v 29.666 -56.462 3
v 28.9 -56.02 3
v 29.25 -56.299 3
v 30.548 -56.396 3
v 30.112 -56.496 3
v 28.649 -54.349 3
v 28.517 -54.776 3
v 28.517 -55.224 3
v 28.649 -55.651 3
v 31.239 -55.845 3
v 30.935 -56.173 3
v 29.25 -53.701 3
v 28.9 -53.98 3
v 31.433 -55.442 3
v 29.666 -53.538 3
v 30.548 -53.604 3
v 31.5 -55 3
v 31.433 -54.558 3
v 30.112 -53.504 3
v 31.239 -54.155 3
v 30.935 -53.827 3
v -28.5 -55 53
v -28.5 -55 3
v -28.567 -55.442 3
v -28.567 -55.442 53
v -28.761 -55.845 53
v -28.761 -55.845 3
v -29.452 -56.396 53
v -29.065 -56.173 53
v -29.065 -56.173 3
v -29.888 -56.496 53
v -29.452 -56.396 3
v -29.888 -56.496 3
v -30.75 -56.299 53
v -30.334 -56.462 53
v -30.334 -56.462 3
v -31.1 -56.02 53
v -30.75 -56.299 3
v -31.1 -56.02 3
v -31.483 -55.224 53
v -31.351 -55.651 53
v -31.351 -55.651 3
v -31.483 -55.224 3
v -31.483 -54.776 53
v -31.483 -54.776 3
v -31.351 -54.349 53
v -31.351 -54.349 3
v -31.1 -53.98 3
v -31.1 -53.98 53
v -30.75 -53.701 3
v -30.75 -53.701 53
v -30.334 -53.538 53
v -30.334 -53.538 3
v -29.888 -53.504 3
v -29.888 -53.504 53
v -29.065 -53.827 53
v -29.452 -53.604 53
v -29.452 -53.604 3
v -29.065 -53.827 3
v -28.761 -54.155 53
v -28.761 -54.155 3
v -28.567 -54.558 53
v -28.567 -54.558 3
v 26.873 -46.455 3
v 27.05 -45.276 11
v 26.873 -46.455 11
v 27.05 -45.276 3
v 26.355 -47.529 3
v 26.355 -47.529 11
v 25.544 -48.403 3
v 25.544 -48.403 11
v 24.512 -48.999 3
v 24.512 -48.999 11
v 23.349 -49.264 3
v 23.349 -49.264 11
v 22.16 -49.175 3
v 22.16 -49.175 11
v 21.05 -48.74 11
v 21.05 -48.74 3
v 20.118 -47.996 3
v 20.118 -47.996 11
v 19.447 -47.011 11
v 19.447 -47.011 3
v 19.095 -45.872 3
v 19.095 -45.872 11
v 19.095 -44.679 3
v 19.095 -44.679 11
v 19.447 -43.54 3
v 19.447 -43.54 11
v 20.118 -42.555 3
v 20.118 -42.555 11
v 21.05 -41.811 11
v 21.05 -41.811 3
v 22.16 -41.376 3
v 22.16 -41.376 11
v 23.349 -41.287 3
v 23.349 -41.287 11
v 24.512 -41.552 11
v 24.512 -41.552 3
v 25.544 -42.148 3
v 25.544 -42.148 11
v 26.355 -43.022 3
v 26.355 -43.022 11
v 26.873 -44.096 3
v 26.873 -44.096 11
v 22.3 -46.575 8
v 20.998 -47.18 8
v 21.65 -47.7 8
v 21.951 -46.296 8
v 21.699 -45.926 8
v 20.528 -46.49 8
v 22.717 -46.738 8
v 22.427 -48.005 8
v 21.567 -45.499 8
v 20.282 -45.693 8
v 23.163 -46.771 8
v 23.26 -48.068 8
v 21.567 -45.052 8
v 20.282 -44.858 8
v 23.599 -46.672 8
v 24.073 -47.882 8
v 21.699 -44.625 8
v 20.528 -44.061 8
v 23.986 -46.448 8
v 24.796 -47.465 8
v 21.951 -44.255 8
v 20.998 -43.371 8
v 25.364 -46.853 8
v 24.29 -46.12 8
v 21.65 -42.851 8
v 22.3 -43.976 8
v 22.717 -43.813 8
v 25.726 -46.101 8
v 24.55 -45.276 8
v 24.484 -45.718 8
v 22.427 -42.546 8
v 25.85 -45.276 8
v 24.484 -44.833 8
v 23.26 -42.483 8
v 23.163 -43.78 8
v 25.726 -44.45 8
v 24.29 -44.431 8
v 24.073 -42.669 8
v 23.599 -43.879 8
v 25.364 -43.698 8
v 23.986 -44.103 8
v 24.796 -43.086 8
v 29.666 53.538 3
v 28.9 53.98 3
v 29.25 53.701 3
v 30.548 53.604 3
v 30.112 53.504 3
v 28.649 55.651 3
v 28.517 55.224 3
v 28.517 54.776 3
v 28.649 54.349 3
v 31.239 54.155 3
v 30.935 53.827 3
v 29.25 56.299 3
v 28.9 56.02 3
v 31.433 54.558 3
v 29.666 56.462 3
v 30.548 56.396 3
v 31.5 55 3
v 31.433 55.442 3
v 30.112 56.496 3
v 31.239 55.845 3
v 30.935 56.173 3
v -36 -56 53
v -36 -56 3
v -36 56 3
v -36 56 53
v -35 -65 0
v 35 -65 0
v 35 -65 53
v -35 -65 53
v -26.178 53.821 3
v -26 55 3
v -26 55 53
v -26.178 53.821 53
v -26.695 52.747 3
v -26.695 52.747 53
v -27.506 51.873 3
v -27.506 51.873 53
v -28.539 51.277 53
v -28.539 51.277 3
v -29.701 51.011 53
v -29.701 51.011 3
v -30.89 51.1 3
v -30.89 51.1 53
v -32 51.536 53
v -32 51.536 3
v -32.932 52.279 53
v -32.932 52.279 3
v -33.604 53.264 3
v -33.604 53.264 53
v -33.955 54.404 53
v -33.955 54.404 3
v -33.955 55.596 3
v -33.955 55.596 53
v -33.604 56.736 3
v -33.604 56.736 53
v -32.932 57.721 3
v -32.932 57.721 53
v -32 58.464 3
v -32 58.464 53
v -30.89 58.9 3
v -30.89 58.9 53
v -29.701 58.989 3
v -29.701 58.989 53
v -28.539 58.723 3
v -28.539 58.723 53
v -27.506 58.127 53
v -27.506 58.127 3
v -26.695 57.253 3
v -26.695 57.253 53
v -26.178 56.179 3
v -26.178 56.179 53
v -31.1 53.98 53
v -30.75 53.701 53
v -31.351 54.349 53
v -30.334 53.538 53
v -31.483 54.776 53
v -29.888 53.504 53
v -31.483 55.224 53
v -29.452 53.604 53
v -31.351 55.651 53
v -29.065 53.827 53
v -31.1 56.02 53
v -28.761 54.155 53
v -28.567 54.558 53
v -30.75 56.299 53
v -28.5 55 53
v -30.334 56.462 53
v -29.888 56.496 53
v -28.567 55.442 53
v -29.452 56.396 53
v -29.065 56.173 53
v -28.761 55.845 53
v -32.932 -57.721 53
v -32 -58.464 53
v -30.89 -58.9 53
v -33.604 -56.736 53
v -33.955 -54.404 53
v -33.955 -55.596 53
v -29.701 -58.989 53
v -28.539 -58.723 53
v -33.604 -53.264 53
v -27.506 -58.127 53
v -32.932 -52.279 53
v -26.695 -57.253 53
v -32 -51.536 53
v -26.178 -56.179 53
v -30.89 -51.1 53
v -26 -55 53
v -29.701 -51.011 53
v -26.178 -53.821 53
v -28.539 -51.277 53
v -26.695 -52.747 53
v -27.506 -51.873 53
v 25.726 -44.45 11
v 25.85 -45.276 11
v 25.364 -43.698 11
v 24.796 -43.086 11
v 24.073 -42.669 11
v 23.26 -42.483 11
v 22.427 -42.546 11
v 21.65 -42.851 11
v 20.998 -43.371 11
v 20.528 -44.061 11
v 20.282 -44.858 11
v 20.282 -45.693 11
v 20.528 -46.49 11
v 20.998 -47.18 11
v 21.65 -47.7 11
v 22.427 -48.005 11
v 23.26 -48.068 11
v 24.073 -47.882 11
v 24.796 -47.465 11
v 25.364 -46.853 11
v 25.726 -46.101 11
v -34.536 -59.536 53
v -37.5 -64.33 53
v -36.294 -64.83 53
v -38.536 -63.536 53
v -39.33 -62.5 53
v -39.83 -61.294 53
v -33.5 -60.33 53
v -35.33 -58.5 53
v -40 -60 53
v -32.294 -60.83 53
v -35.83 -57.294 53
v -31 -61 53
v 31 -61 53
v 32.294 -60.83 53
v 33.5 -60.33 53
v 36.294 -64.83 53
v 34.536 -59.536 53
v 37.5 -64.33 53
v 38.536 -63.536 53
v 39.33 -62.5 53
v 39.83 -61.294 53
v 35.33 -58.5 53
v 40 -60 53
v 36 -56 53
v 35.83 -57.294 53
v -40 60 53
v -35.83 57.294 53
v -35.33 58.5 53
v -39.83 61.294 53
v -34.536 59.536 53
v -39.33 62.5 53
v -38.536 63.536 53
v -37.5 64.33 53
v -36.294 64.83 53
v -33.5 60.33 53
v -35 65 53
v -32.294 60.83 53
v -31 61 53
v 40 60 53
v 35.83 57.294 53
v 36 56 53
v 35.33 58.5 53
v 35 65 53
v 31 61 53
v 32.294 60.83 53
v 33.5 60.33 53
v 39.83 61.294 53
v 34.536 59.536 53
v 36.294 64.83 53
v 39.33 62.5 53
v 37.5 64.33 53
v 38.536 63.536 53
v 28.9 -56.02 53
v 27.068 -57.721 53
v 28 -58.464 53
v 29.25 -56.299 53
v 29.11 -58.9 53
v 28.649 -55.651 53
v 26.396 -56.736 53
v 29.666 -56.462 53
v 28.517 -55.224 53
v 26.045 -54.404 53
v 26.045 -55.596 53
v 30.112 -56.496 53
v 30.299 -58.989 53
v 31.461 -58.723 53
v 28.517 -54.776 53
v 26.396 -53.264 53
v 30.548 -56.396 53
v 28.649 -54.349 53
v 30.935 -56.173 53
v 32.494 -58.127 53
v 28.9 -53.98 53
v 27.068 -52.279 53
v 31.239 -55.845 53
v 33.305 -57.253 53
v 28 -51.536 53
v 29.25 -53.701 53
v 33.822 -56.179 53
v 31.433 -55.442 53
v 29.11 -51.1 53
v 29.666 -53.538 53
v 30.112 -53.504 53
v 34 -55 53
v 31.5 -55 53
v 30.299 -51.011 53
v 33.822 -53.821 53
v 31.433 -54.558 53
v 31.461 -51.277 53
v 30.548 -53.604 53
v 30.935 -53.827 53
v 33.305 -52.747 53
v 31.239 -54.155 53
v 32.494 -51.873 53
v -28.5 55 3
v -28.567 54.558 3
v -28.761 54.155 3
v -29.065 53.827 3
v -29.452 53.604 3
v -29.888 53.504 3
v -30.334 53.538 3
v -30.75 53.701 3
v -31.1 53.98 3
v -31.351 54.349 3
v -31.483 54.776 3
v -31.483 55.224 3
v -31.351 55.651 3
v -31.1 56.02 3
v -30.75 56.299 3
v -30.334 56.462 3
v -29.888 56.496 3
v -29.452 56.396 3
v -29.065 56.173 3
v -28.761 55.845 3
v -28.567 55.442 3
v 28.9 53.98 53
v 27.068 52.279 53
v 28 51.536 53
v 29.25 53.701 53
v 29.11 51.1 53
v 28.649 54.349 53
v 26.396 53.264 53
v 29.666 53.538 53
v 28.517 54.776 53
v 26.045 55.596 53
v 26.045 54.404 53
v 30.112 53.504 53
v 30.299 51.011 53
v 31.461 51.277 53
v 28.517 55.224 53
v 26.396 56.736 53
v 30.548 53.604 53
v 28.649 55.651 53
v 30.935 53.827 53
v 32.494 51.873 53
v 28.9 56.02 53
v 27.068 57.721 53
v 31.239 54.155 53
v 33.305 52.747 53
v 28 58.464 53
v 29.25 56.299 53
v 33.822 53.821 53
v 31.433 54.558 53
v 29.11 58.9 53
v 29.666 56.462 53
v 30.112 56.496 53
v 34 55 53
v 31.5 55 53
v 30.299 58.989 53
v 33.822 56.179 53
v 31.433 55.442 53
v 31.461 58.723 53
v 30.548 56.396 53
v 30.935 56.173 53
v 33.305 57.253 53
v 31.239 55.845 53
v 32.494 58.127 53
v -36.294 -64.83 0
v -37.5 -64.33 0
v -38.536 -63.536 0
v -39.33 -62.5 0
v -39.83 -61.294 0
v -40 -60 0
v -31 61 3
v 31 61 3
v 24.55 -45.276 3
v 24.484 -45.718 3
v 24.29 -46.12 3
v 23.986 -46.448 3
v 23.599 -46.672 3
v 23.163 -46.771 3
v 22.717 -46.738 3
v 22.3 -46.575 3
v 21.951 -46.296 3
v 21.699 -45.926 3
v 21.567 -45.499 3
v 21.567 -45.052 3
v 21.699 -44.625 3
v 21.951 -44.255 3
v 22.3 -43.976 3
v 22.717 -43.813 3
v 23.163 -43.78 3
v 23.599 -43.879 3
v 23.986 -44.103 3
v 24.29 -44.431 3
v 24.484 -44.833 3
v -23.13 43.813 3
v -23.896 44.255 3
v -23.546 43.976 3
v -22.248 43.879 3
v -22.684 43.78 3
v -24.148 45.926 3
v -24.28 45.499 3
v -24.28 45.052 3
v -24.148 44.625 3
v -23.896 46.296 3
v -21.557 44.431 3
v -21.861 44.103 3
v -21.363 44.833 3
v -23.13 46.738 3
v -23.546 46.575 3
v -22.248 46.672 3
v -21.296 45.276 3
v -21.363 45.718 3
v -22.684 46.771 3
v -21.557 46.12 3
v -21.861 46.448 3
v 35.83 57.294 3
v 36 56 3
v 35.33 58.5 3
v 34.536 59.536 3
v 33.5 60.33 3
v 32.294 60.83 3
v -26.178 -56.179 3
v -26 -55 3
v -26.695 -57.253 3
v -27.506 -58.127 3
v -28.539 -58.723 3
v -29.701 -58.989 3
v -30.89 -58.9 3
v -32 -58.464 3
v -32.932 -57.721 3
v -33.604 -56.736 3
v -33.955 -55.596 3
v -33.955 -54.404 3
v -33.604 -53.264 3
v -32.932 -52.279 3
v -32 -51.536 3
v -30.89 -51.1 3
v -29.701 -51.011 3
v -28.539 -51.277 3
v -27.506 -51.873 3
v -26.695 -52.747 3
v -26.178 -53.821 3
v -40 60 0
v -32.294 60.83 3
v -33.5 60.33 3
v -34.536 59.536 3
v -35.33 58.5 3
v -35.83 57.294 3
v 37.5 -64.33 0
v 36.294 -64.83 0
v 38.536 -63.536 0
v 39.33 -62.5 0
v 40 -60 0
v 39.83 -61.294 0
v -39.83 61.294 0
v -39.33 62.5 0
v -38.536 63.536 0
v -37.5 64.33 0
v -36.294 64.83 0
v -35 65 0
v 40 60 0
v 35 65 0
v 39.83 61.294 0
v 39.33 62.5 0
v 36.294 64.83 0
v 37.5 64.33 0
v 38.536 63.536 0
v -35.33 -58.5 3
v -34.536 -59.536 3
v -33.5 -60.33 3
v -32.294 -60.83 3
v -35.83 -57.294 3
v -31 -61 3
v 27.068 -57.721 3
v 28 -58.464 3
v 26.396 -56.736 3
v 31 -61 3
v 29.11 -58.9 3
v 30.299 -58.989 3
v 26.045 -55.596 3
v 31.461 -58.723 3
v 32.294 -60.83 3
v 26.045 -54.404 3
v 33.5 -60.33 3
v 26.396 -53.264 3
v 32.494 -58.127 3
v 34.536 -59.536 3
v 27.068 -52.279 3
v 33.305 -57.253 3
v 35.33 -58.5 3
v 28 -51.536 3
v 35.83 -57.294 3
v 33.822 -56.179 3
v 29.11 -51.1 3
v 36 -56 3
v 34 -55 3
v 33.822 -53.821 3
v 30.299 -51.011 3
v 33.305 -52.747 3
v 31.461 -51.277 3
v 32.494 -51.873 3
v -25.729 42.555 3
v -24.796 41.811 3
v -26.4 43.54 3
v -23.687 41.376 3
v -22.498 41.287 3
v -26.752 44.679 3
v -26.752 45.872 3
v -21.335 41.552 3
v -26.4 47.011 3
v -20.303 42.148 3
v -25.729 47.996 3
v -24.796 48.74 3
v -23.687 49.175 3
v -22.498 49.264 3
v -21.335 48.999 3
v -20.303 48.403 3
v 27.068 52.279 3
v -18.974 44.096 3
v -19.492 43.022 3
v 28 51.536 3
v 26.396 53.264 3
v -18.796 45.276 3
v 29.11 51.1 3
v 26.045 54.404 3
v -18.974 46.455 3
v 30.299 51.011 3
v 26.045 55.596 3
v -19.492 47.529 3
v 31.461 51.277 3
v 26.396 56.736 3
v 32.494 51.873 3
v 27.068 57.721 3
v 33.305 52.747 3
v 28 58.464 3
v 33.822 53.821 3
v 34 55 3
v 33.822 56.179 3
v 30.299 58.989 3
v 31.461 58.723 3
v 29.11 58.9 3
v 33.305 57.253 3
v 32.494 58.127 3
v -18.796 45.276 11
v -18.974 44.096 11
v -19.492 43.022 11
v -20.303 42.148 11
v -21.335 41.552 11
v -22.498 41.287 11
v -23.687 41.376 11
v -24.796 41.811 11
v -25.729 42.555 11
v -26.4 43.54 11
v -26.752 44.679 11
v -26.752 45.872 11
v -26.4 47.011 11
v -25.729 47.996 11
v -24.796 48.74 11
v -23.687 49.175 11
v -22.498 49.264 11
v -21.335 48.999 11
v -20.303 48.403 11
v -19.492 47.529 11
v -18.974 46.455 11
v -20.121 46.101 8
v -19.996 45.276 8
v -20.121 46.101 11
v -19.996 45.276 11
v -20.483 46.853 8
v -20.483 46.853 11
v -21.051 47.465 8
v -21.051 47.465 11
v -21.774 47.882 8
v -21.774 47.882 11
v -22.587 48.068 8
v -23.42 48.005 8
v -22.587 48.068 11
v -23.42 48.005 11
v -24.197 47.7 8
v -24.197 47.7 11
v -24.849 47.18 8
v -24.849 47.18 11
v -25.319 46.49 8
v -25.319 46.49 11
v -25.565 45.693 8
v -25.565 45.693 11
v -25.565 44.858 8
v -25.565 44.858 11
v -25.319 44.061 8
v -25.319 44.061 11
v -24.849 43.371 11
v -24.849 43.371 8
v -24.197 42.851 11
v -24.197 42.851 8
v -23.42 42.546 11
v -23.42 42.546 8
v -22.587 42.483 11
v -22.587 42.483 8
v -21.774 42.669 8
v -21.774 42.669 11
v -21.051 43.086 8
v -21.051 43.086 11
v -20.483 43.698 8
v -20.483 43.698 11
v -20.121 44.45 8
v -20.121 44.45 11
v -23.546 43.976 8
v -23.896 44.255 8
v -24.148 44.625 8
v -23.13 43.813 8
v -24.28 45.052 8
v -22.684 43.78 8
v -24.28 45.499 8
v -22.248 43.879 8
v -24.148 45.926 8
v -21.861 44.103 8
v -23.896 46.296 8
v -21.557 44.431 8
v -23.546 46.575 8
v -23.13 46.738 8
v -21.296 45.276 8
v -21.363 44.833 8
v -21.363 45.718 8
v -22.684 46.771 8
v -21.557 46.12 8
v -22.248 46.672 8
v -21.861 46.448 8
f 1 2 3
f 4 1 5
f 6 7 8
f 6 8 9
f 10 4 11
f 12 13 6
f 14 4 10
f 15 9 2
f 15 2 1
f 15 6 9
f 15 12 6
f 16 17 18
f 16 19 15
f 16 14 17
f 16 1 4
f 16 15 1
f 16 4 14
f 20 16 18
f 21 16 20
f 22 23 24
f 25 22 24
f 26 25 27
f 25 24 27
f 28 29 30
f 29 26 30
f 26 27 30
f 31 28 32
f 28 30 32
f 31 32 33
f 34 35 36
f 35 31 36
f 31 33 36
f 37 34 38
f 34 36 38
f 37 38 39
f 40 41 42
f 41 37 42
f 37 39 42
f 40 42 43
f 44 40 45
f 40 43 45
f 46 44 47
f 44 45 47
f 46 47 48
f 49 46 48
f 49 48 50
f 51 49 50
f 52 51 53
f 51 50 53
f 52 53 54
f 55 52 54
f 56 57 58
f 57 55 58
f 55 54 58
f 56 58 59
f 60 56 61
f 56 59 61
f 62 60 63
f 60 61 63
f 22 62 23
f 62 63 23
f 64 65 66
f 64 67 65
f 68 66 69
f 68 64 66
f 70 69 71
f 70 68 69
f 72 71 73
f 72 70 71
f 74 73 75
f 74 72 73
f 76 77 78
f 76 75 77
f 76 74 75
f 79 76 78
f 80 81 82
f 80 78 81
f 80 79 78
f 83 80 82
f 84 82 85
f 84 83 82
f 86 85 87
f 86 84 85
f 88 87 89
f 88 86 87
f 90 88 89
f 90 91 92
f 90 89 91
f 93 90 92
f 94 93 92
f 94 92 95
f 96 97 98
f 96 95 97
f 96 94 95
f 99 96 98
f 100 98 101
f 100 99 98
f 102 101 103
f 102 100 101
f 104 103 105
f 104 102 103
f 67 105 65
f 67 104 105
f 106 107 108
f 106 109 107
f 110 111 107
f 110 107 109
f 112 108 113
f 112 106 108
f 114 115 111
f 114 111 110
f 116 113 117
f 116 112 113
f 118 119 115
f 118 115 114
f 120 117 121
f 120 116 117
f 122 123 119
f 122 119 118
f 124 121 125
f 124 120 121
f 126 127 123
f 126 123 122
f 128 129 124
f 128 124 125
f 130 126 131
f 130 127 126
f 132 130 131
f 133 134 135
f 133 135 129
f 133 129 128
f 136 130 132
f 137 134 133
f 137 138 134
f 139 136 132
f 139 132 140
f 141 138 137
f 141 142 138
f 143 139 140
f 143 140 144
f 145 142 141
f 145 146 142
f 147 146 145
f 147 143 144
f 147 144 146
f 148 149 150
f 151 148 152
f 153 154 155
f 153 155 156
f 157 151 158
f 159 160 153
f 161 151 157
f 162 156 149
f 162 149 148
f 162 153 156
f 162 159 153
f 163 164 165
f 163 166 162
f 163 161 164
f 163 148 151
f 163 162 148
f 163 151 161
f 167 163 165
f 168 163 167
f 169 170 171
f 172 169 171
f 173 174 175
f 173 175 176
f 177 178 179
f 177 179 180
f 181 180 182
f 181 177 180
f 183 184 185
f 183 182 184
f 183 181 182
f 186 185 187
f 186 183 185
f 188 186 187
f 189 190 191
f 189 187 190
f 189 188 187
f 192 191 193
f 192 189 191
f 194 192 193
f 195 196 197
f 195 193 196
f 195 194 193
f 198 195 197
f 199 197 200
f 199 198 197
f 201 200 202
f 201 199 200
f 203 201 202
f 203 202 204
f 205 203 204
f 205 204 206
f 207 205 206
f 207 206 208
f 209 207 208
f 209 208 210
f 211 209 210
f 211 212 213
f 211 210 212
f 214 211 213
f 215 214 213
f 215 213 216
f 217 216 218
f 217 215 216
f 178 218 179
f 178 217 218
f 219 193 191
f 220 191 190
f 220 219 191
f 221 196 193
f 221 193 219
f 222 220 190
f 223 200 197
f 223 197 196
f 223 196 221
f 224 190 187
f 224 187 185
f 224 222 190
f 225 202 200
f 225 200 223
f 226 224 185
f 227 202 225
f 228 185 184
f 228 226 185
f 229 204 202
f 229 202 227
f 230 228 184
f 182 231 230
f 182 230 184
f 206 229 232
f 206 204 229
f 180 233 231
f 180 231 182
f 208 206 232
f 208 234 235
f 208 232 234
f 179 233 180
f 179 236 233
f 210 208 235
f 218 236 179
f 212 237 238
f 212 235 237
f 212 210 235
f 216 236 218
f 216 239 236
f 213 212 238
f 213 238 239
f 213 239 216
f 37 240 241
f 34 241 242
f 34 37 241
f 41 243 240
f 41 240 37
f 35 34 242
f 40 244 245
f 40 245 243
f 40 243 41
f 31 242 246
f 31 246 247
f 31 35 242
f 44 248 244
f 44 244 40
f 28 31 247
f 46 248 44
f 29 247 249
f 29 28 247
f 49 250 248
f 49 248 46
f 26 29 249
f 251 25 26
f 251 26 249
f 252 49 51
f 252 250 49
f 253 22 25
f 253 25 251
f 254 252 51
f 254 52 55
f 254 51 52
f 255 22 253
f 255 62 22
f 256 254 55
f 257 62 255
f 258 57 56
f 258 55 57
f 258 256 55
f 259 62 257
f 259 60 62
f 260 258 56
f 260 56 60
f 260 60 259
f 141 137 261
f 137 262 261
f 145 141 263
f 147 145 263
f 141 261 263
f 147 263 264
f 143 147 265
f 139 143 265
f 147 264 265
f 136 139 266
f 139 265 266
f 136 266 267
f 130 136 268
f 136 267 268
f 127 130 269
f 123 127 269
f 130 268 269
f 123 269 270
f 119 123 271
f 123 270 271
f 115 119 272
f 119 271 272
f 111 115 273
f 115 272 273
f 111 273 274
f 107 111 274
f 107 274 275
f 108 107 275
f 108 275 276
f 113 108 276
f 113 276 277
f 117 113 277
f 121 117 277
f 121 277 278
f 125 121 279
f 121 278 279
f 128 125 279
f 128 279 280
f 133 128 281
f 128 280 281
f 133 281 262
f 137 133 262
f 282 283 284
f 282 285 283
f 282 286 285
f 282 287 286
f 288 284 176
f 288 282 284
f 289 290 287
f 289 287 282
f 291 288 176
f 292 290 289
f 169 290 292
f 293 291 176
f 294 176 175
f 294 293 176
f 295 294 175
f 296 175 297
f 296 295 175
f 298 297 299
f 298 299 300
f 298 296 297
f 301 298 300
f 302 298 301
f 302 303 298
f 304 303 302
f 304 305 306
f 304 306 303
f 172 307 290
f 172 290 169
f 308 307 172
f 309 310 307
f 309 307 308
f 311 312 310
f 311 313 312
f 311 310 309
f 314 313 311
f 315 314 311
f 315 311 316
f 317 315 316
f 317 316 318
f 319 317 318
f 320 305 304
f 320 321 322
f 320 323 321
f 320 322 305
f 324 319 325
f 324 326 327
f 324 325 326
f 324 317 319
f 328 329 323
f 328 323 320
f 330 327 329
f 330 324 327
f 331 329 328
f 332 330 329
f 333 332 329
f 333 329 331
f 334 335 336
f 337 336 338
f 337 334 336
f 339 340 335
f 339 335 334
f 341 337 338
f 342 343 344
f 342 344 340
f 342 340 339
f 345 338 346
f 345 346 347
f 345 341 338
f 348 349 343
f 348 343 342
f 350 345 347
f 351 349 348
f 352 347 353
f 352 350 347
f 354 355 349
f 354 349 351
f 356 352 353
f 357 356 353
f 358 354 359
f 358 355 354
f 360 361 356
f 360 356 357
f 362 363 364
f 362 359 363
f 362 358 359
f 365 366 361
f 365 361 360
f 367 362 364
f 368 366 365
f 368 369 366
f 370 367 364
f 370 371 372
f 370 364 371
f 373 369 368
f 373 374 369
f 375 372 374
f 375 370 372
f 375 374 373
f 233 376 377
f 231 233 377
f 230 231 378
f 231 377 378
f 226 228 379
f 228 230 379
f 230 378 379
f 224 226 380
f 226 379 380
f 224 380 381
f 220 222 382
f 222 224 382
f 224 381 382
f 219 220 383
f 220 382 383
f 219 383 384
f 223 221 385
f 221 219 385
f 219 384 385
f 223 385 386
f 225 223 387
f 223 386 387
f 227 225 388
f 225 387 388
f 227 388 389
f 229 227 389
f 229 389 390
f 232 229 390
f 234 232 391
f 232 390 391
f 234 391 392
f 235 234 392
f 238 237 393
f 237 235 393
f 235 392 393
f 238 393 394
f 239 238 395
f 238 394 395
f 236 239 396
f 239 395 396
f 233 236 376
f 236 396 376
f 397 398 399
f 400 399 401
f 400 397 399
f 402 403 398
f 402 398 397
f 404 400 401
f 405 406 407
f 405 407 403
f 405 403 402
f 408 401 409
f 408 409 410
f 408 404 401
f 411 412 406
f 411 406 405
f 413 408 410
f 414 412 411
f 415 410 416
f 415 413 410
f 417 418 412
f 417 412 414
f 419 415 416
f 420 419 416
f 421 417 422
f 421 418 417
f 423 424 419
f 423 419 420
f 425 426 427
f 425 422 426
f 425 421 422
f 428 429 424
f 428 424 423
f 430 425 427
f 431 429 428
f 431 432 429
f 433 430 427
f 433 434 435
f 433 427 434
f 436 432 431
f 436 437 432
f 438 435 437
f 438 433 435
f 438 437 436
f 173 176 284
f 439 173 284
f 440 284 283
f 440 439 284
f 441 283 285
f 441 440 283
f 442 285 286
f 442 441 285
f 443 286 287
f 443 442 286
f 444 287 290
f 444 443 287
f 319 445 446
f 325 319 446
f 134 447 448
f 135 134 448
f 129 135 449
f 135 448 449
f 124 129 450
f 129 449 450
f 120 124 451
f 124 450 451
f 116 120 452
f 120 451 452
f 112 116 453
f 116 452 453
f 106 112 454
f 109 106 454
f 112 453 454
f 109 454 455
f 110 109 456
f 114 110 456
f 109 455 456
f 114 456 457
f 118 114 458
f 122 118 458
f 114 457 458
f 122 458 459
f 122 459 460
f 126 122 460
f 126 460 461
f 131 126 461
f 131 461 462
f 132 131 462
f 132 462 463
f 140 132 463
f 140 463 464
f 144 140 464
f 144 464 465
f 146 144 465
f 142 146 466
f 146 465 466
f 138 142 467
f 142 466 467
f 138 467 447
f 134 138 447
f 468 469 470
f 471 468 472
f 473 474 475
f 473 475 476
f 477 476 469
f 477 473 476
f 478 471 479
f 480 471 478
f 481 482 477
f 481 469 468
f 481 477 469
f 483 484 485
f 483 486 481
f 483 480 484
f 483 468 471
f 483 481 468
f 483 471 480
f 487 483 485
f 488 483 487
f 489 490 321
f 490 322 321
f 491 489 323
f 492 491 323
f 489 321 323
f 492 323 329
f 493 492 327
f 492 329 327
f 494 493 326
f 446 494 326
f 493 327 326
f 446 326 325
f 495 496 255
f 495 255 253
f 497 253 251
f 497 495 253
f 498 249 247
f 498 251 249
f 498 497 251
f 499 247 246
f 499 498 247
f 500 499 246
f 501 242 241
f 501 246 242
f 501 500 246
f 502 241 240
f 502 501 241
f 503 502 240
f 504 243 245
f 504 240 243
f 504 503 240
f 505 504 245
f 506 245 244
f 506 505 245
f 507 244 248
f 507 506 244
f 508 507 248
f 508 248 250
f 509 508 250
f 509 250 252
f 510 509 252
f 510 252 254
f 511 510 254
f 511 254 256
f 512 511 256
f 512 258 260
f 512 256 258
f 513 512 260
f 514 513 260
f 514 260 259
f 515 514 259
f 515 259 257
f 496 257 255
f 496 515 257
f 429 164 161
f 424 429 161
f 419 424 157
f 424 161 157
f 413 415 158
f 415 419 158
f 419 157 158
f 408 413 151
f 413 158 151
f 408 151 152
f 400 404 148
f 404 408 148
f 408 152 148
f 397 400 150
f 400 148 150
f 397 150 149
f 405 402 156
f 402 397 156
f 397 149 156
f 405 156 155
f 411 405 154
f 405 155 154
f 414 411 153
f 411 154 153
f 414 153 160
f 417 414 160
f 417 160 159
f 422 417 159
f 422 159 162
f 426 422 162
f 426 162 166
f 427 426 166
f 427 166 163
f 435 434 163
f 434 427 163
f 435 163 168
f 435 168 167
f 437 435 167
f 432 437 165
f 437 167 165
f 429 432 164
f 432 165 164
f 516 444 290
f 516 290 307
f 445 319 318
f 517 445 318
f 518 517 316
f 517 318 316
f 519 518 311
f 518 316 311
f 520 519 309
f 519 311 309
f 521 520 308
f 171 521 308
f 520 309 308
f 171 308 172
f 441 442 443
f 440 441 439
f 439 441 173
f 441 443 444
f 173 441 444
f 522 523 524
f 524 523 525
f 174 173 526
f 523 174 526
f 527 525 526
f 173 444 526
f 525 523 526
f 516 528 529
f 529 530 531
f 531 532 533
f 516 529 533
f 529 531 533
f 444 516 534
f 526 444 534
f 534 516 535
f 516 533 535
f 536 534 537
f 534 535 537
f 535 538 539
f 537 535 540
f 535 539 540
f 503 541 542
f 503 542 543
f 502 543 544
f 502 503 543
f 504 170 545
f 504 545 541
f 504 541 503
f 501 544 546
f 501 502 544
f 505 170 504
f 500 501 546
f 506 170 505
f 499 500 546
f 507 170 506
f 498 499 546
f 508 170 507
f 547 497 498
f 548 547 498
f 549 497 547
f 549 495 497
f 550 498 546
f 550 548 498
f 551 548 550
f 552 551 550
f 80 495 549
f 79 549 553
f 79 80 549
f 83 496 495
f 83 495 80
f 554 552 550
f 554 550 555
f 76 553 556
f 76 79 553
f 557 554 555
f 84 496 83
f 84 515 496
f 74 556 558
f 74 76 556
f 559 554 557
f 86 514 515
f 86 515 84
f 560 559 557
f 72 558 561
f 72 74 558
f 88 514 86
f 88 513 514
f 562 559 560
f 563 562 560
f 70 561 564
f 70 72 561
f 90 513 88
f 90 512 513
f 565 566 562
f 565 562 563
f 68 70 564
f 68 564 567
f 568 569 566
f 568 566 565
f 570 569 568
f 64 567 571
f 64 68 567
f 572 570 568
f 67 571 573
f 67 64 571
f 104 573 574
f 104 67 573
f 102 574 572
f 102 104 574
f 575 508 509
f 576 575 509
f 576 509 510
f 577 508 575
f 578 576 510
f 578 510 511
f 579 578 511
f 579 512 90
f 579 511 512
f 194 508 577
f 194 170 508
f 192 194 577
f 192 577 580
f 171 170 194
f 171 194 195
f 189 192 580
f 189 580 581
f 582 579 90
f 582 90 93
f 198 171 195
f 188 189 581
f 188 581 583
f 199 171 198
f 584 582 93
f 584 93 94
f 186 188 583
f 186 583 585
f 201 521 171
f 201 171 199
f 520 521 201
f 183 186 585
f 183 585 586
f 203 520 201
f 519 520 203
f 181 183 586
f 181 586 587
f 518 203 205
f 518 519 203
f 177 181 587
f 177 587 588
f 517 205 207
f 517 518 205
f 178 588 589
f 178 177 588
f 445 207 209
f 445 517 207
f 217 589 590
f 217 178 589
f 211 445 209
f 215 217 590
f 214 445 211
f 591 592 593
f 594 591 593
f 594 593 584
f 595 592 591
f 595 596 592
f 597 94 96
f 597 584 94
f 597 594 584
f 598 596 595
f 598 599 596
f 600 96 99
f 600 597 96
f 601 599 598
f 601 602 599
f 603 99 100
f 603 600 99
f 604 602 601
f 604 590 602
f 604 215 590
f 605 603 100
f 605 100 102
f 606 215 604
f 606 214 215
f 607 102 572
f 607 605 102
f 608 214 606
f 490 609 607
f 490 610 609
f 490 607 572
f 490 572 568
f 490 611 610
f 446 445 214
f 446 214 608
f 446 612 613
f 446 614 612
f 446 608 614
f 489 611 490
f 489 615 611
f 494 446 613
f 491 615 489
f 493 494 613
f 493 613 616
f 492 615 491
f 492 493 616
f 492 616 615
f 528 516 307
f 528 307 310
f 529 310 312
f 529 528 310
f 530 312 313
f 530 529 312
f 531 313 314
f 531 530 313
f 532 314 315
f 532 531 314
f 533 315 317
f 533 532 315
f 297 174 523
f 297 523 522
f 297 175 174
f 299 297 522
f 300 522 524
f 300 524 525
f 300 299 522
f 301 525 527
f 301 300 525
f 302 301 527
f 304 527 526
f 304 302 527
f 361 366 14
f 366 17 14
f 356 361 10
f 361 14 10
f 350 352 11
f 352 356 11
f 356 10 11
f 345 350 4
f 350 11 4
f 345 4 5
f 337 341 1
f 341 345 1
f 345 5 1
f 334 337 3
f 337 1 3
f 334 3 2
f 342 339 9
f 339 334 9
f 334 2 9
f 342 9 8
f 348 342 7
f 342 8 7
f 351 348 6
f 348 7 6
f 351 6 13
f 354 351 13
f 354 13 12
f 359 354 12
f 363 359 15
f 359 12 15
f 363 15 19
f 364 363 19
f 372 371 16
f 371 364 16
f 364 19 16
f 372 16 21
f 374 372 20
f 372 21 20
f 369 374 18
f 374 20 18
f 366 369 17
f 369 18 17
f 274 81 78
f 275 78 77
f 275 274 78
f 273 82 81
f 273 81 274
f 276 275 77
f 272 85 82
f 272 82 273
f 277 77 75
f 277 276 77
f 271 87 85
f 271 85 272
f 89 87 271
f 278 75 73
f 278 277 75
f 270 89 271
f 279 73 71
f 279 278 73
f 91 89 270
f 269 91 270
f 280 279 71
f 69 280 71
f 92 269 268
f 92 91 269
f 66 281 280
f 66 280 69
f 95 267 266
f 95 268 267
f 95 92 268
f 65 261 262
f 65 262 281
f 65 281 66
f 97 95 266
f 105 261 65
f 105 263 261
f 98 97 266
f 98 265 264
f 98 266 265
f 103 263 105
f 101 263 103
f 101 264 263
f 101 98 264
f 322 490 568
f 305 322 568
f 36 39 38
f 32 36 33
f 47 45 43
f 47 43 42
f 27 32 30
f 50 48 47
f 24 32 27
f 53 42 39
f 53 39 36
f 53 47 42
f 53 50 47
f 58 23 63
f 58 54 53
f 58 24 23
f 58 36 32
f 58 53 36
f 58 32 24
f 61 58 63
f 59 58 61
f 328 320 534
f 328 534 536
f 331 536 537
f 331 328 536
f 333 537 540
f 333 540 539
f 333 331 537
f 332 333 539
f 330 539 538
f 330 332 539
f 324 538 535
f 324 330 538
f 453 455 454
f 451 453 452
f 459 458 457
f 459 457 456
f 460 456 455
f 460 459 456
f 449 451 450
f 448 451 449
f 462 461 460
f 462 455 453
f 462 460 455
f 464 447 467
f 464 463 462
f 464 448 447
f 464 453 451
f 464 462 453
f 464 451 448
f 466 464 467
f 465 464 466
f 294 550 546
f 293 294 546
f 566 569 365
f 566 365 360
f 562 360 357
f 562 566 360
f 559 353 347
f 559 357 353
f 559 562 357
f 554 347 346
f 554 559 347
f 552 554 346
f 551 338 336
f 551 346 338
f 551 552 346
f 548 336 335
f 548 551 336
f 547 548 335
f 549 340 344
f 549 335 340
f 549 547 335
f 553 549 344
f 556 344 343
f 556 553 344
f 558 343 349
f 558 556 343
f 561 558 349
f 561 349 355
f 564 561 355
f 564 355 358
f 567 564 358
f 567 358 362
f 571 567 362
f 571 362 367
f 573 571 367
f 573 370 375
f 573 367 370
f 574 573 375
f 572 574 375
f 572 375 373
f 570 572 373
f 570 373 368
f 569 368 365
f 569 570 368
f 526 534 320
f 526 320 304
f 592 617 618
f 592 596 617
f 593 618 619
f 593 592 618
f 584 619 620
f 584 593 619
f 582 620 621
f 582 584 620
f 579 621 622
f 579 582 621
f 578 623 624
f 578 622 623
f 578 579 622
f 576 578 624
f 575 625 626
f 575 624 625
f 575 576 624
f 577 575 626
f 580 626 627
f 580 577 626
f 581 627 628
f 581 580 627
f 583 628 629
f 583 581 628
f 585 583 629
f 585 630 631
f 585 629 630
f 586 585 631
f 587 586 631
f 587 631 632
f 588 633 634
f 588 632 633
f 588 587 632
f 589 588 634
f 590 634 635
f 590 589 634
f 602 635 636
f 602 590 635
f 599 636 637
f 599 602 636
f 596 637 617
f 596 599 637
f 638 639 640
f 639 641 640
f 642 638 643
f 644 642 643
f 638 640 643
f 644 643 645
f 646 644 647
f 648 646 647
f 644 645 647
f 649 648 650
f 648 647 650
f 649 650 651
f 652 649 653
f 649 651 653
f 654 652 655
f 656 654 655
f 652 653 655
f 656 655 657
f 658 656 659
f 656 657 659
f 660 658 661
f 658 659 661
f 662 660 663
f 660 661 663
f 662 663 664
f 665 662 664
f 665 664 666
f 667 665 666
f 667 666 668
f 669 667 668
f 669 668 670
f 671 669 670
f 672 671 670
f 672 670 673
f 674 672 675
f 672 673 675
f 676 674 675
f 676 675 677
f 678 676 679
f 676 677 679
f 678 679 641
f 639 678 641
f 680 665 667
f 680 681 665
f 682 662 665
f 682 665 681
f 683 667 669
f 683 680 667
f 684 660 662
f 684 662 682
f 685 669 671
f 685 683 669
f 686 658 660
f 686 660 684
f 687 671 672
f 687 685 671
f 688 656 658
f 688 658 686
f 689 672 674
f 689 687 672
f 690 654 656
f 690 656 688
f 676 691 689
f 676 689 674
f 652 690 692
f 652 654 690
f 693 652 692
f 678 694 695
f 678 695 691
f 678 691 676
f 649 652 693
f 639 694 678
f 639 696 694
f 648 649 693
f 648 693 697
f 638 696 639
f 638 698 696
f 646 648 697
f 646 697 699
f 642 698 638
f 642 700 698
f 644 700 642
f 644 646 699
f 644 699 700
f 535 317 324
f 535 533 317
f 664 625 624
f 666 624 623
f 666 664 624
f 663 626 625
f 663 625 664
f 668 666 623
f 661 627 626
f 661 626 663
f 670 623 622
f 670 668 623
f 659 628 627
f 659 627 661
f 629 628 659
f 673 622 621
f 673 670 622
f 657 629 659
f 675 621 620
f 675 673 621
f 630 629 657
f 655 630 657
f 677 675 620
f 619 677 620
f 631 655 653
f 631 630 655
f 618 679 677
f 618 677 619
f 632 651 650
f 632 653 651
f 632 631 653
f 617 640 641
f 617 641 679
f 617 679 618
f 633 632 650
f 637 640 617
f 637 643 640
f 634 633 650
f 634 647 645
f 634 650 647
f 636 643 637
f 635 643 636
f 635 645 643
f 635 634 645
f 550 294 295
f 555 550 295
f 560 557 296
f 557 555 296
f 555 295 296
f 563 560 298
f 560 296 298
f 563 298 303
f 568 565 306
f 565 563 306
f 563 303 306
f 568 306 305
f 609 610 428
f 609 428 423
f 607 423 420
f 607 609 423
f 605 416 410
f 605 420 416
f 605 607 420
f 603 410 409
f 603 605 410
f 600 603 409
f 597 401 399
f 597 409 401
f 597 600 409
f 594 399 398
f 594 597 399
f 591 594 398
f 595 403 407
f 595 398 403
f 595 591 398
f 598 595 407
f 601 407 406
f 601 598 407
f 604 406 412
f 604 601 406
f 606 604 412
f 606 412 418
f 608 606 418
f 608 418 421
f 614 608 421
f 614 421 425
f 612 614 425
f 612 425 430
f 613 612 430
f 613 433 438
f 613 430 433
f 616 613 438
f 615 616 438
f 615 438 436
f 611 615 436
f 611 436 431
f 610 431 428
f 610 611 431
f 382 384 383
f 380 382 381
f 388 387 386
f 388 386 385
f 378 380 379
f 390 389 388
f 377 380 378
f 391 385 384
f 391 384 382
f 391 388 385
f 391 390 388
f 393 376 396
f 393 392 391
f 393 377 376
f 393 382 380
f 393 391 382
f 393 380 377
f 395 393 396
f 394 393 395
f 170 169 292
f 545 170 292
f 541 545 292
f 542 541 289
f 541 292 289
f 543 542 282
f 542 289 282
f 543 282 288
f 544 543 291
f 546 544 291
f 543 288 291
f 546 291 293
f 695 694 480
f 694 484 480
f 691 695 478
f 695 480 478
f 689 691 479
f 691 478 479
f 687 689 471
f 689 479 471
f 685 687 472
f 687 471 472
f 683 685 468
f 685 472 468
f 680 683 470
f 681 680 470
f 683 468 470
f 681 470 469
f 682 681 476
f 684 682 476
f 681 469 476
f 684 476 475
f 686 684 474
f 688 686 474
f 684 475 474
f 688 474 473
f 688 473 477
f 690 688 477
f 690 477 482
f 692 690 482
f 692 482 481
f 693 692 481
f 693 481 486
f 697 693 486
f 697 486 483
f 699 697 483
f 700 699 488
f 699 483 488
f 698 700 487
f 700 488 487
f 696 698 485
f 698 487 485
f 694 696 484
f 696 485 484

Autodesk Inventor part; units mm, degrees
ref_plane "YZ Plane" through (0, 0, 0) normal (1, 0, 0) x (0, 1, 0)
ref_plane "XZ Plane" through (0, 0, 0) normal (0, 1, 0) x (-1, 0, 0)
ref_plane "XY Plane" through (0, 0, 0) normal (0, 0, 1) x (1, 0, 0)
sketch "Sketch1" plane through (0, 0, 0) normal (0, 0, 1) x (1, 0, 0)
  line L0 (40, -65) -> (-40, -65)
  line L1 (-40, -65) -> (-40, 65)
  line L2 (-40, 65) -> (40, 65)
  line L3 (40, 65) -> (40, -65)
  line L4 (40, -65) -> (-40, 65) construction
  line L5 (-40, -65) -> (40, 65) construction
  point P0 (0, 0)
  dimension "d0" = 80
  dimension "d1" = 130
extrude "Extrusion1" add sketch "Sketch1" along normal blind 3
sketch "Sketch4" plane through (0, 0, 3) normal (0, 0, 1) x (1, 0, 0)
  line L0 (26.4795, -48.7045) -> (-26.4795, 48.7045) construction
  line L1 (-26.4795, -48.7045) -> (26.4795, 48.7045) construction
  circle A0 centre (-22.7965, 45.2755) radius 1.5
  circle A1 centre (23.0505, -45.2755) radius 1.5
  circle A2 centre (-22.7965, 45.2755) radius 4
  circle A3 centre (23.0505, -45.2755) radius 4
  point P0 (0, 0)
  dimension "d13" = 52.959
  dimension "d14" = 97.409
  dimension "d17" = 3
  dimension "d20" = 3
  dimension "d36" = 8
  dimension "d37" = 8
sketch "Sketch5" plane through (0, 0, 3) normal (0, 0, 1) x (1, 0, 0)
  line L0 (-40, 65) -> (-40, -65) projected
  line L1 (40, -65) -> (-40, -65)
  line L2 (-40, -65) -> (-40, 65)
  line L3 (40, 65) -> (40, -65)
  line L4 (36, -61) -> (-36, -61)
  line L5 (-36, -61) -> (-36, 61)
  line L6 (-36, 61) -> (36, 61)
  line L7 (36, 61) -> (36, -61)
  line L8 (40, 65) -> (-40, 65) projected
  line L9 (40, 65) -> (-40, 65)
  line L10 (-40, -65) -> (40, -65) projected
  point P0 (0, 0)
  dimension "d28" = 72
  dimension "d29" = 122
  dimension "d30" = 61
  dimension "d33" = 36
  dimension "d34" = 130
  dimension "d35" = 80
  dimension "d50" = 0
extrude "Extrusion4" add sketch "Sketch5" along normal blind 50
extrude "Extrusion5" add sketch "Sketch4" along normal blind 8
sketch "Sketch7" plane through (-22.7965, 45.2755, 11) normal (0, 0, 1) x (1, 0, 0)
  circle A0 centre (0, 0) radius 2.8
  point P0 (22.7965, -45.2755)
  dimension "d40" = 5.6
extrude "Extrusion6" cut sketch "Sketch7" against normal blind 3
sketch "Sketch8" plane through (23.0505, -45.2755, 11) normal (0, 0, 1) x (1, 0, 0)
  circle A0 centre (0, 0) radius 2.8
  point P0 (-23.0505, 45.2755)
  dimension "d43" = 5.6
extrude "Extrusion7" cut sketch "Sketch8" against normal blind 3
sketch "Sketch11" plane through (0, 0, 3) normal (0, 0, 1) x (1, 0, 0)
  circle A0 centre (-30, 55) radius 4
  circle A1 centre (30, 55) radius 4
  circle A2 centre (30, -55) radius 4
  circle A3 centre (-30, -55) radius 4
  line L0 (40, 65) -> (-40, 65) projected
  line L1 (-40, -65) -> (40, -65) projected
  circle A4 centre (-30, 55) radius 1.5
  circle A5 centre (30, 55) radius 1.5
  circle A6 centre (-30, -55) radius 1.5
  circle A7 centre (30, -55) radius 1.5
  point P0 (0, 0)
  dimension "d51" = 8
  dimension "d52" = 8
  dimension "d53" = 8
  dimension "d54" = 8
  dimension "d55" = 10
  dimension "d56" = 10
  dimension "d57" = 10
  dimension "d58" = 10
  dimension "d59" = 30
  dimension "d60" = 30
  dimension "d61" = 30
  dimension "d62" = 30
  dimension "d63" = 3
  dimension "d64" = 3
  dimension "d65" = 3
  dimension "d66" = 3
extrude "Extrusion8" add sketch "Sketch11" along normal blind 50
fillet "Fillet1" radius 5 8 edges at (40, -65, 26.5) (-40, -65, 26.5) (-40, 65, 26.5) (40, 65, 26.5) (-36, -61, 28) (36, -61, 28) (-36, 61, 28) (36, 61, 28)
properties part number "theMonarchPCBHolder"
